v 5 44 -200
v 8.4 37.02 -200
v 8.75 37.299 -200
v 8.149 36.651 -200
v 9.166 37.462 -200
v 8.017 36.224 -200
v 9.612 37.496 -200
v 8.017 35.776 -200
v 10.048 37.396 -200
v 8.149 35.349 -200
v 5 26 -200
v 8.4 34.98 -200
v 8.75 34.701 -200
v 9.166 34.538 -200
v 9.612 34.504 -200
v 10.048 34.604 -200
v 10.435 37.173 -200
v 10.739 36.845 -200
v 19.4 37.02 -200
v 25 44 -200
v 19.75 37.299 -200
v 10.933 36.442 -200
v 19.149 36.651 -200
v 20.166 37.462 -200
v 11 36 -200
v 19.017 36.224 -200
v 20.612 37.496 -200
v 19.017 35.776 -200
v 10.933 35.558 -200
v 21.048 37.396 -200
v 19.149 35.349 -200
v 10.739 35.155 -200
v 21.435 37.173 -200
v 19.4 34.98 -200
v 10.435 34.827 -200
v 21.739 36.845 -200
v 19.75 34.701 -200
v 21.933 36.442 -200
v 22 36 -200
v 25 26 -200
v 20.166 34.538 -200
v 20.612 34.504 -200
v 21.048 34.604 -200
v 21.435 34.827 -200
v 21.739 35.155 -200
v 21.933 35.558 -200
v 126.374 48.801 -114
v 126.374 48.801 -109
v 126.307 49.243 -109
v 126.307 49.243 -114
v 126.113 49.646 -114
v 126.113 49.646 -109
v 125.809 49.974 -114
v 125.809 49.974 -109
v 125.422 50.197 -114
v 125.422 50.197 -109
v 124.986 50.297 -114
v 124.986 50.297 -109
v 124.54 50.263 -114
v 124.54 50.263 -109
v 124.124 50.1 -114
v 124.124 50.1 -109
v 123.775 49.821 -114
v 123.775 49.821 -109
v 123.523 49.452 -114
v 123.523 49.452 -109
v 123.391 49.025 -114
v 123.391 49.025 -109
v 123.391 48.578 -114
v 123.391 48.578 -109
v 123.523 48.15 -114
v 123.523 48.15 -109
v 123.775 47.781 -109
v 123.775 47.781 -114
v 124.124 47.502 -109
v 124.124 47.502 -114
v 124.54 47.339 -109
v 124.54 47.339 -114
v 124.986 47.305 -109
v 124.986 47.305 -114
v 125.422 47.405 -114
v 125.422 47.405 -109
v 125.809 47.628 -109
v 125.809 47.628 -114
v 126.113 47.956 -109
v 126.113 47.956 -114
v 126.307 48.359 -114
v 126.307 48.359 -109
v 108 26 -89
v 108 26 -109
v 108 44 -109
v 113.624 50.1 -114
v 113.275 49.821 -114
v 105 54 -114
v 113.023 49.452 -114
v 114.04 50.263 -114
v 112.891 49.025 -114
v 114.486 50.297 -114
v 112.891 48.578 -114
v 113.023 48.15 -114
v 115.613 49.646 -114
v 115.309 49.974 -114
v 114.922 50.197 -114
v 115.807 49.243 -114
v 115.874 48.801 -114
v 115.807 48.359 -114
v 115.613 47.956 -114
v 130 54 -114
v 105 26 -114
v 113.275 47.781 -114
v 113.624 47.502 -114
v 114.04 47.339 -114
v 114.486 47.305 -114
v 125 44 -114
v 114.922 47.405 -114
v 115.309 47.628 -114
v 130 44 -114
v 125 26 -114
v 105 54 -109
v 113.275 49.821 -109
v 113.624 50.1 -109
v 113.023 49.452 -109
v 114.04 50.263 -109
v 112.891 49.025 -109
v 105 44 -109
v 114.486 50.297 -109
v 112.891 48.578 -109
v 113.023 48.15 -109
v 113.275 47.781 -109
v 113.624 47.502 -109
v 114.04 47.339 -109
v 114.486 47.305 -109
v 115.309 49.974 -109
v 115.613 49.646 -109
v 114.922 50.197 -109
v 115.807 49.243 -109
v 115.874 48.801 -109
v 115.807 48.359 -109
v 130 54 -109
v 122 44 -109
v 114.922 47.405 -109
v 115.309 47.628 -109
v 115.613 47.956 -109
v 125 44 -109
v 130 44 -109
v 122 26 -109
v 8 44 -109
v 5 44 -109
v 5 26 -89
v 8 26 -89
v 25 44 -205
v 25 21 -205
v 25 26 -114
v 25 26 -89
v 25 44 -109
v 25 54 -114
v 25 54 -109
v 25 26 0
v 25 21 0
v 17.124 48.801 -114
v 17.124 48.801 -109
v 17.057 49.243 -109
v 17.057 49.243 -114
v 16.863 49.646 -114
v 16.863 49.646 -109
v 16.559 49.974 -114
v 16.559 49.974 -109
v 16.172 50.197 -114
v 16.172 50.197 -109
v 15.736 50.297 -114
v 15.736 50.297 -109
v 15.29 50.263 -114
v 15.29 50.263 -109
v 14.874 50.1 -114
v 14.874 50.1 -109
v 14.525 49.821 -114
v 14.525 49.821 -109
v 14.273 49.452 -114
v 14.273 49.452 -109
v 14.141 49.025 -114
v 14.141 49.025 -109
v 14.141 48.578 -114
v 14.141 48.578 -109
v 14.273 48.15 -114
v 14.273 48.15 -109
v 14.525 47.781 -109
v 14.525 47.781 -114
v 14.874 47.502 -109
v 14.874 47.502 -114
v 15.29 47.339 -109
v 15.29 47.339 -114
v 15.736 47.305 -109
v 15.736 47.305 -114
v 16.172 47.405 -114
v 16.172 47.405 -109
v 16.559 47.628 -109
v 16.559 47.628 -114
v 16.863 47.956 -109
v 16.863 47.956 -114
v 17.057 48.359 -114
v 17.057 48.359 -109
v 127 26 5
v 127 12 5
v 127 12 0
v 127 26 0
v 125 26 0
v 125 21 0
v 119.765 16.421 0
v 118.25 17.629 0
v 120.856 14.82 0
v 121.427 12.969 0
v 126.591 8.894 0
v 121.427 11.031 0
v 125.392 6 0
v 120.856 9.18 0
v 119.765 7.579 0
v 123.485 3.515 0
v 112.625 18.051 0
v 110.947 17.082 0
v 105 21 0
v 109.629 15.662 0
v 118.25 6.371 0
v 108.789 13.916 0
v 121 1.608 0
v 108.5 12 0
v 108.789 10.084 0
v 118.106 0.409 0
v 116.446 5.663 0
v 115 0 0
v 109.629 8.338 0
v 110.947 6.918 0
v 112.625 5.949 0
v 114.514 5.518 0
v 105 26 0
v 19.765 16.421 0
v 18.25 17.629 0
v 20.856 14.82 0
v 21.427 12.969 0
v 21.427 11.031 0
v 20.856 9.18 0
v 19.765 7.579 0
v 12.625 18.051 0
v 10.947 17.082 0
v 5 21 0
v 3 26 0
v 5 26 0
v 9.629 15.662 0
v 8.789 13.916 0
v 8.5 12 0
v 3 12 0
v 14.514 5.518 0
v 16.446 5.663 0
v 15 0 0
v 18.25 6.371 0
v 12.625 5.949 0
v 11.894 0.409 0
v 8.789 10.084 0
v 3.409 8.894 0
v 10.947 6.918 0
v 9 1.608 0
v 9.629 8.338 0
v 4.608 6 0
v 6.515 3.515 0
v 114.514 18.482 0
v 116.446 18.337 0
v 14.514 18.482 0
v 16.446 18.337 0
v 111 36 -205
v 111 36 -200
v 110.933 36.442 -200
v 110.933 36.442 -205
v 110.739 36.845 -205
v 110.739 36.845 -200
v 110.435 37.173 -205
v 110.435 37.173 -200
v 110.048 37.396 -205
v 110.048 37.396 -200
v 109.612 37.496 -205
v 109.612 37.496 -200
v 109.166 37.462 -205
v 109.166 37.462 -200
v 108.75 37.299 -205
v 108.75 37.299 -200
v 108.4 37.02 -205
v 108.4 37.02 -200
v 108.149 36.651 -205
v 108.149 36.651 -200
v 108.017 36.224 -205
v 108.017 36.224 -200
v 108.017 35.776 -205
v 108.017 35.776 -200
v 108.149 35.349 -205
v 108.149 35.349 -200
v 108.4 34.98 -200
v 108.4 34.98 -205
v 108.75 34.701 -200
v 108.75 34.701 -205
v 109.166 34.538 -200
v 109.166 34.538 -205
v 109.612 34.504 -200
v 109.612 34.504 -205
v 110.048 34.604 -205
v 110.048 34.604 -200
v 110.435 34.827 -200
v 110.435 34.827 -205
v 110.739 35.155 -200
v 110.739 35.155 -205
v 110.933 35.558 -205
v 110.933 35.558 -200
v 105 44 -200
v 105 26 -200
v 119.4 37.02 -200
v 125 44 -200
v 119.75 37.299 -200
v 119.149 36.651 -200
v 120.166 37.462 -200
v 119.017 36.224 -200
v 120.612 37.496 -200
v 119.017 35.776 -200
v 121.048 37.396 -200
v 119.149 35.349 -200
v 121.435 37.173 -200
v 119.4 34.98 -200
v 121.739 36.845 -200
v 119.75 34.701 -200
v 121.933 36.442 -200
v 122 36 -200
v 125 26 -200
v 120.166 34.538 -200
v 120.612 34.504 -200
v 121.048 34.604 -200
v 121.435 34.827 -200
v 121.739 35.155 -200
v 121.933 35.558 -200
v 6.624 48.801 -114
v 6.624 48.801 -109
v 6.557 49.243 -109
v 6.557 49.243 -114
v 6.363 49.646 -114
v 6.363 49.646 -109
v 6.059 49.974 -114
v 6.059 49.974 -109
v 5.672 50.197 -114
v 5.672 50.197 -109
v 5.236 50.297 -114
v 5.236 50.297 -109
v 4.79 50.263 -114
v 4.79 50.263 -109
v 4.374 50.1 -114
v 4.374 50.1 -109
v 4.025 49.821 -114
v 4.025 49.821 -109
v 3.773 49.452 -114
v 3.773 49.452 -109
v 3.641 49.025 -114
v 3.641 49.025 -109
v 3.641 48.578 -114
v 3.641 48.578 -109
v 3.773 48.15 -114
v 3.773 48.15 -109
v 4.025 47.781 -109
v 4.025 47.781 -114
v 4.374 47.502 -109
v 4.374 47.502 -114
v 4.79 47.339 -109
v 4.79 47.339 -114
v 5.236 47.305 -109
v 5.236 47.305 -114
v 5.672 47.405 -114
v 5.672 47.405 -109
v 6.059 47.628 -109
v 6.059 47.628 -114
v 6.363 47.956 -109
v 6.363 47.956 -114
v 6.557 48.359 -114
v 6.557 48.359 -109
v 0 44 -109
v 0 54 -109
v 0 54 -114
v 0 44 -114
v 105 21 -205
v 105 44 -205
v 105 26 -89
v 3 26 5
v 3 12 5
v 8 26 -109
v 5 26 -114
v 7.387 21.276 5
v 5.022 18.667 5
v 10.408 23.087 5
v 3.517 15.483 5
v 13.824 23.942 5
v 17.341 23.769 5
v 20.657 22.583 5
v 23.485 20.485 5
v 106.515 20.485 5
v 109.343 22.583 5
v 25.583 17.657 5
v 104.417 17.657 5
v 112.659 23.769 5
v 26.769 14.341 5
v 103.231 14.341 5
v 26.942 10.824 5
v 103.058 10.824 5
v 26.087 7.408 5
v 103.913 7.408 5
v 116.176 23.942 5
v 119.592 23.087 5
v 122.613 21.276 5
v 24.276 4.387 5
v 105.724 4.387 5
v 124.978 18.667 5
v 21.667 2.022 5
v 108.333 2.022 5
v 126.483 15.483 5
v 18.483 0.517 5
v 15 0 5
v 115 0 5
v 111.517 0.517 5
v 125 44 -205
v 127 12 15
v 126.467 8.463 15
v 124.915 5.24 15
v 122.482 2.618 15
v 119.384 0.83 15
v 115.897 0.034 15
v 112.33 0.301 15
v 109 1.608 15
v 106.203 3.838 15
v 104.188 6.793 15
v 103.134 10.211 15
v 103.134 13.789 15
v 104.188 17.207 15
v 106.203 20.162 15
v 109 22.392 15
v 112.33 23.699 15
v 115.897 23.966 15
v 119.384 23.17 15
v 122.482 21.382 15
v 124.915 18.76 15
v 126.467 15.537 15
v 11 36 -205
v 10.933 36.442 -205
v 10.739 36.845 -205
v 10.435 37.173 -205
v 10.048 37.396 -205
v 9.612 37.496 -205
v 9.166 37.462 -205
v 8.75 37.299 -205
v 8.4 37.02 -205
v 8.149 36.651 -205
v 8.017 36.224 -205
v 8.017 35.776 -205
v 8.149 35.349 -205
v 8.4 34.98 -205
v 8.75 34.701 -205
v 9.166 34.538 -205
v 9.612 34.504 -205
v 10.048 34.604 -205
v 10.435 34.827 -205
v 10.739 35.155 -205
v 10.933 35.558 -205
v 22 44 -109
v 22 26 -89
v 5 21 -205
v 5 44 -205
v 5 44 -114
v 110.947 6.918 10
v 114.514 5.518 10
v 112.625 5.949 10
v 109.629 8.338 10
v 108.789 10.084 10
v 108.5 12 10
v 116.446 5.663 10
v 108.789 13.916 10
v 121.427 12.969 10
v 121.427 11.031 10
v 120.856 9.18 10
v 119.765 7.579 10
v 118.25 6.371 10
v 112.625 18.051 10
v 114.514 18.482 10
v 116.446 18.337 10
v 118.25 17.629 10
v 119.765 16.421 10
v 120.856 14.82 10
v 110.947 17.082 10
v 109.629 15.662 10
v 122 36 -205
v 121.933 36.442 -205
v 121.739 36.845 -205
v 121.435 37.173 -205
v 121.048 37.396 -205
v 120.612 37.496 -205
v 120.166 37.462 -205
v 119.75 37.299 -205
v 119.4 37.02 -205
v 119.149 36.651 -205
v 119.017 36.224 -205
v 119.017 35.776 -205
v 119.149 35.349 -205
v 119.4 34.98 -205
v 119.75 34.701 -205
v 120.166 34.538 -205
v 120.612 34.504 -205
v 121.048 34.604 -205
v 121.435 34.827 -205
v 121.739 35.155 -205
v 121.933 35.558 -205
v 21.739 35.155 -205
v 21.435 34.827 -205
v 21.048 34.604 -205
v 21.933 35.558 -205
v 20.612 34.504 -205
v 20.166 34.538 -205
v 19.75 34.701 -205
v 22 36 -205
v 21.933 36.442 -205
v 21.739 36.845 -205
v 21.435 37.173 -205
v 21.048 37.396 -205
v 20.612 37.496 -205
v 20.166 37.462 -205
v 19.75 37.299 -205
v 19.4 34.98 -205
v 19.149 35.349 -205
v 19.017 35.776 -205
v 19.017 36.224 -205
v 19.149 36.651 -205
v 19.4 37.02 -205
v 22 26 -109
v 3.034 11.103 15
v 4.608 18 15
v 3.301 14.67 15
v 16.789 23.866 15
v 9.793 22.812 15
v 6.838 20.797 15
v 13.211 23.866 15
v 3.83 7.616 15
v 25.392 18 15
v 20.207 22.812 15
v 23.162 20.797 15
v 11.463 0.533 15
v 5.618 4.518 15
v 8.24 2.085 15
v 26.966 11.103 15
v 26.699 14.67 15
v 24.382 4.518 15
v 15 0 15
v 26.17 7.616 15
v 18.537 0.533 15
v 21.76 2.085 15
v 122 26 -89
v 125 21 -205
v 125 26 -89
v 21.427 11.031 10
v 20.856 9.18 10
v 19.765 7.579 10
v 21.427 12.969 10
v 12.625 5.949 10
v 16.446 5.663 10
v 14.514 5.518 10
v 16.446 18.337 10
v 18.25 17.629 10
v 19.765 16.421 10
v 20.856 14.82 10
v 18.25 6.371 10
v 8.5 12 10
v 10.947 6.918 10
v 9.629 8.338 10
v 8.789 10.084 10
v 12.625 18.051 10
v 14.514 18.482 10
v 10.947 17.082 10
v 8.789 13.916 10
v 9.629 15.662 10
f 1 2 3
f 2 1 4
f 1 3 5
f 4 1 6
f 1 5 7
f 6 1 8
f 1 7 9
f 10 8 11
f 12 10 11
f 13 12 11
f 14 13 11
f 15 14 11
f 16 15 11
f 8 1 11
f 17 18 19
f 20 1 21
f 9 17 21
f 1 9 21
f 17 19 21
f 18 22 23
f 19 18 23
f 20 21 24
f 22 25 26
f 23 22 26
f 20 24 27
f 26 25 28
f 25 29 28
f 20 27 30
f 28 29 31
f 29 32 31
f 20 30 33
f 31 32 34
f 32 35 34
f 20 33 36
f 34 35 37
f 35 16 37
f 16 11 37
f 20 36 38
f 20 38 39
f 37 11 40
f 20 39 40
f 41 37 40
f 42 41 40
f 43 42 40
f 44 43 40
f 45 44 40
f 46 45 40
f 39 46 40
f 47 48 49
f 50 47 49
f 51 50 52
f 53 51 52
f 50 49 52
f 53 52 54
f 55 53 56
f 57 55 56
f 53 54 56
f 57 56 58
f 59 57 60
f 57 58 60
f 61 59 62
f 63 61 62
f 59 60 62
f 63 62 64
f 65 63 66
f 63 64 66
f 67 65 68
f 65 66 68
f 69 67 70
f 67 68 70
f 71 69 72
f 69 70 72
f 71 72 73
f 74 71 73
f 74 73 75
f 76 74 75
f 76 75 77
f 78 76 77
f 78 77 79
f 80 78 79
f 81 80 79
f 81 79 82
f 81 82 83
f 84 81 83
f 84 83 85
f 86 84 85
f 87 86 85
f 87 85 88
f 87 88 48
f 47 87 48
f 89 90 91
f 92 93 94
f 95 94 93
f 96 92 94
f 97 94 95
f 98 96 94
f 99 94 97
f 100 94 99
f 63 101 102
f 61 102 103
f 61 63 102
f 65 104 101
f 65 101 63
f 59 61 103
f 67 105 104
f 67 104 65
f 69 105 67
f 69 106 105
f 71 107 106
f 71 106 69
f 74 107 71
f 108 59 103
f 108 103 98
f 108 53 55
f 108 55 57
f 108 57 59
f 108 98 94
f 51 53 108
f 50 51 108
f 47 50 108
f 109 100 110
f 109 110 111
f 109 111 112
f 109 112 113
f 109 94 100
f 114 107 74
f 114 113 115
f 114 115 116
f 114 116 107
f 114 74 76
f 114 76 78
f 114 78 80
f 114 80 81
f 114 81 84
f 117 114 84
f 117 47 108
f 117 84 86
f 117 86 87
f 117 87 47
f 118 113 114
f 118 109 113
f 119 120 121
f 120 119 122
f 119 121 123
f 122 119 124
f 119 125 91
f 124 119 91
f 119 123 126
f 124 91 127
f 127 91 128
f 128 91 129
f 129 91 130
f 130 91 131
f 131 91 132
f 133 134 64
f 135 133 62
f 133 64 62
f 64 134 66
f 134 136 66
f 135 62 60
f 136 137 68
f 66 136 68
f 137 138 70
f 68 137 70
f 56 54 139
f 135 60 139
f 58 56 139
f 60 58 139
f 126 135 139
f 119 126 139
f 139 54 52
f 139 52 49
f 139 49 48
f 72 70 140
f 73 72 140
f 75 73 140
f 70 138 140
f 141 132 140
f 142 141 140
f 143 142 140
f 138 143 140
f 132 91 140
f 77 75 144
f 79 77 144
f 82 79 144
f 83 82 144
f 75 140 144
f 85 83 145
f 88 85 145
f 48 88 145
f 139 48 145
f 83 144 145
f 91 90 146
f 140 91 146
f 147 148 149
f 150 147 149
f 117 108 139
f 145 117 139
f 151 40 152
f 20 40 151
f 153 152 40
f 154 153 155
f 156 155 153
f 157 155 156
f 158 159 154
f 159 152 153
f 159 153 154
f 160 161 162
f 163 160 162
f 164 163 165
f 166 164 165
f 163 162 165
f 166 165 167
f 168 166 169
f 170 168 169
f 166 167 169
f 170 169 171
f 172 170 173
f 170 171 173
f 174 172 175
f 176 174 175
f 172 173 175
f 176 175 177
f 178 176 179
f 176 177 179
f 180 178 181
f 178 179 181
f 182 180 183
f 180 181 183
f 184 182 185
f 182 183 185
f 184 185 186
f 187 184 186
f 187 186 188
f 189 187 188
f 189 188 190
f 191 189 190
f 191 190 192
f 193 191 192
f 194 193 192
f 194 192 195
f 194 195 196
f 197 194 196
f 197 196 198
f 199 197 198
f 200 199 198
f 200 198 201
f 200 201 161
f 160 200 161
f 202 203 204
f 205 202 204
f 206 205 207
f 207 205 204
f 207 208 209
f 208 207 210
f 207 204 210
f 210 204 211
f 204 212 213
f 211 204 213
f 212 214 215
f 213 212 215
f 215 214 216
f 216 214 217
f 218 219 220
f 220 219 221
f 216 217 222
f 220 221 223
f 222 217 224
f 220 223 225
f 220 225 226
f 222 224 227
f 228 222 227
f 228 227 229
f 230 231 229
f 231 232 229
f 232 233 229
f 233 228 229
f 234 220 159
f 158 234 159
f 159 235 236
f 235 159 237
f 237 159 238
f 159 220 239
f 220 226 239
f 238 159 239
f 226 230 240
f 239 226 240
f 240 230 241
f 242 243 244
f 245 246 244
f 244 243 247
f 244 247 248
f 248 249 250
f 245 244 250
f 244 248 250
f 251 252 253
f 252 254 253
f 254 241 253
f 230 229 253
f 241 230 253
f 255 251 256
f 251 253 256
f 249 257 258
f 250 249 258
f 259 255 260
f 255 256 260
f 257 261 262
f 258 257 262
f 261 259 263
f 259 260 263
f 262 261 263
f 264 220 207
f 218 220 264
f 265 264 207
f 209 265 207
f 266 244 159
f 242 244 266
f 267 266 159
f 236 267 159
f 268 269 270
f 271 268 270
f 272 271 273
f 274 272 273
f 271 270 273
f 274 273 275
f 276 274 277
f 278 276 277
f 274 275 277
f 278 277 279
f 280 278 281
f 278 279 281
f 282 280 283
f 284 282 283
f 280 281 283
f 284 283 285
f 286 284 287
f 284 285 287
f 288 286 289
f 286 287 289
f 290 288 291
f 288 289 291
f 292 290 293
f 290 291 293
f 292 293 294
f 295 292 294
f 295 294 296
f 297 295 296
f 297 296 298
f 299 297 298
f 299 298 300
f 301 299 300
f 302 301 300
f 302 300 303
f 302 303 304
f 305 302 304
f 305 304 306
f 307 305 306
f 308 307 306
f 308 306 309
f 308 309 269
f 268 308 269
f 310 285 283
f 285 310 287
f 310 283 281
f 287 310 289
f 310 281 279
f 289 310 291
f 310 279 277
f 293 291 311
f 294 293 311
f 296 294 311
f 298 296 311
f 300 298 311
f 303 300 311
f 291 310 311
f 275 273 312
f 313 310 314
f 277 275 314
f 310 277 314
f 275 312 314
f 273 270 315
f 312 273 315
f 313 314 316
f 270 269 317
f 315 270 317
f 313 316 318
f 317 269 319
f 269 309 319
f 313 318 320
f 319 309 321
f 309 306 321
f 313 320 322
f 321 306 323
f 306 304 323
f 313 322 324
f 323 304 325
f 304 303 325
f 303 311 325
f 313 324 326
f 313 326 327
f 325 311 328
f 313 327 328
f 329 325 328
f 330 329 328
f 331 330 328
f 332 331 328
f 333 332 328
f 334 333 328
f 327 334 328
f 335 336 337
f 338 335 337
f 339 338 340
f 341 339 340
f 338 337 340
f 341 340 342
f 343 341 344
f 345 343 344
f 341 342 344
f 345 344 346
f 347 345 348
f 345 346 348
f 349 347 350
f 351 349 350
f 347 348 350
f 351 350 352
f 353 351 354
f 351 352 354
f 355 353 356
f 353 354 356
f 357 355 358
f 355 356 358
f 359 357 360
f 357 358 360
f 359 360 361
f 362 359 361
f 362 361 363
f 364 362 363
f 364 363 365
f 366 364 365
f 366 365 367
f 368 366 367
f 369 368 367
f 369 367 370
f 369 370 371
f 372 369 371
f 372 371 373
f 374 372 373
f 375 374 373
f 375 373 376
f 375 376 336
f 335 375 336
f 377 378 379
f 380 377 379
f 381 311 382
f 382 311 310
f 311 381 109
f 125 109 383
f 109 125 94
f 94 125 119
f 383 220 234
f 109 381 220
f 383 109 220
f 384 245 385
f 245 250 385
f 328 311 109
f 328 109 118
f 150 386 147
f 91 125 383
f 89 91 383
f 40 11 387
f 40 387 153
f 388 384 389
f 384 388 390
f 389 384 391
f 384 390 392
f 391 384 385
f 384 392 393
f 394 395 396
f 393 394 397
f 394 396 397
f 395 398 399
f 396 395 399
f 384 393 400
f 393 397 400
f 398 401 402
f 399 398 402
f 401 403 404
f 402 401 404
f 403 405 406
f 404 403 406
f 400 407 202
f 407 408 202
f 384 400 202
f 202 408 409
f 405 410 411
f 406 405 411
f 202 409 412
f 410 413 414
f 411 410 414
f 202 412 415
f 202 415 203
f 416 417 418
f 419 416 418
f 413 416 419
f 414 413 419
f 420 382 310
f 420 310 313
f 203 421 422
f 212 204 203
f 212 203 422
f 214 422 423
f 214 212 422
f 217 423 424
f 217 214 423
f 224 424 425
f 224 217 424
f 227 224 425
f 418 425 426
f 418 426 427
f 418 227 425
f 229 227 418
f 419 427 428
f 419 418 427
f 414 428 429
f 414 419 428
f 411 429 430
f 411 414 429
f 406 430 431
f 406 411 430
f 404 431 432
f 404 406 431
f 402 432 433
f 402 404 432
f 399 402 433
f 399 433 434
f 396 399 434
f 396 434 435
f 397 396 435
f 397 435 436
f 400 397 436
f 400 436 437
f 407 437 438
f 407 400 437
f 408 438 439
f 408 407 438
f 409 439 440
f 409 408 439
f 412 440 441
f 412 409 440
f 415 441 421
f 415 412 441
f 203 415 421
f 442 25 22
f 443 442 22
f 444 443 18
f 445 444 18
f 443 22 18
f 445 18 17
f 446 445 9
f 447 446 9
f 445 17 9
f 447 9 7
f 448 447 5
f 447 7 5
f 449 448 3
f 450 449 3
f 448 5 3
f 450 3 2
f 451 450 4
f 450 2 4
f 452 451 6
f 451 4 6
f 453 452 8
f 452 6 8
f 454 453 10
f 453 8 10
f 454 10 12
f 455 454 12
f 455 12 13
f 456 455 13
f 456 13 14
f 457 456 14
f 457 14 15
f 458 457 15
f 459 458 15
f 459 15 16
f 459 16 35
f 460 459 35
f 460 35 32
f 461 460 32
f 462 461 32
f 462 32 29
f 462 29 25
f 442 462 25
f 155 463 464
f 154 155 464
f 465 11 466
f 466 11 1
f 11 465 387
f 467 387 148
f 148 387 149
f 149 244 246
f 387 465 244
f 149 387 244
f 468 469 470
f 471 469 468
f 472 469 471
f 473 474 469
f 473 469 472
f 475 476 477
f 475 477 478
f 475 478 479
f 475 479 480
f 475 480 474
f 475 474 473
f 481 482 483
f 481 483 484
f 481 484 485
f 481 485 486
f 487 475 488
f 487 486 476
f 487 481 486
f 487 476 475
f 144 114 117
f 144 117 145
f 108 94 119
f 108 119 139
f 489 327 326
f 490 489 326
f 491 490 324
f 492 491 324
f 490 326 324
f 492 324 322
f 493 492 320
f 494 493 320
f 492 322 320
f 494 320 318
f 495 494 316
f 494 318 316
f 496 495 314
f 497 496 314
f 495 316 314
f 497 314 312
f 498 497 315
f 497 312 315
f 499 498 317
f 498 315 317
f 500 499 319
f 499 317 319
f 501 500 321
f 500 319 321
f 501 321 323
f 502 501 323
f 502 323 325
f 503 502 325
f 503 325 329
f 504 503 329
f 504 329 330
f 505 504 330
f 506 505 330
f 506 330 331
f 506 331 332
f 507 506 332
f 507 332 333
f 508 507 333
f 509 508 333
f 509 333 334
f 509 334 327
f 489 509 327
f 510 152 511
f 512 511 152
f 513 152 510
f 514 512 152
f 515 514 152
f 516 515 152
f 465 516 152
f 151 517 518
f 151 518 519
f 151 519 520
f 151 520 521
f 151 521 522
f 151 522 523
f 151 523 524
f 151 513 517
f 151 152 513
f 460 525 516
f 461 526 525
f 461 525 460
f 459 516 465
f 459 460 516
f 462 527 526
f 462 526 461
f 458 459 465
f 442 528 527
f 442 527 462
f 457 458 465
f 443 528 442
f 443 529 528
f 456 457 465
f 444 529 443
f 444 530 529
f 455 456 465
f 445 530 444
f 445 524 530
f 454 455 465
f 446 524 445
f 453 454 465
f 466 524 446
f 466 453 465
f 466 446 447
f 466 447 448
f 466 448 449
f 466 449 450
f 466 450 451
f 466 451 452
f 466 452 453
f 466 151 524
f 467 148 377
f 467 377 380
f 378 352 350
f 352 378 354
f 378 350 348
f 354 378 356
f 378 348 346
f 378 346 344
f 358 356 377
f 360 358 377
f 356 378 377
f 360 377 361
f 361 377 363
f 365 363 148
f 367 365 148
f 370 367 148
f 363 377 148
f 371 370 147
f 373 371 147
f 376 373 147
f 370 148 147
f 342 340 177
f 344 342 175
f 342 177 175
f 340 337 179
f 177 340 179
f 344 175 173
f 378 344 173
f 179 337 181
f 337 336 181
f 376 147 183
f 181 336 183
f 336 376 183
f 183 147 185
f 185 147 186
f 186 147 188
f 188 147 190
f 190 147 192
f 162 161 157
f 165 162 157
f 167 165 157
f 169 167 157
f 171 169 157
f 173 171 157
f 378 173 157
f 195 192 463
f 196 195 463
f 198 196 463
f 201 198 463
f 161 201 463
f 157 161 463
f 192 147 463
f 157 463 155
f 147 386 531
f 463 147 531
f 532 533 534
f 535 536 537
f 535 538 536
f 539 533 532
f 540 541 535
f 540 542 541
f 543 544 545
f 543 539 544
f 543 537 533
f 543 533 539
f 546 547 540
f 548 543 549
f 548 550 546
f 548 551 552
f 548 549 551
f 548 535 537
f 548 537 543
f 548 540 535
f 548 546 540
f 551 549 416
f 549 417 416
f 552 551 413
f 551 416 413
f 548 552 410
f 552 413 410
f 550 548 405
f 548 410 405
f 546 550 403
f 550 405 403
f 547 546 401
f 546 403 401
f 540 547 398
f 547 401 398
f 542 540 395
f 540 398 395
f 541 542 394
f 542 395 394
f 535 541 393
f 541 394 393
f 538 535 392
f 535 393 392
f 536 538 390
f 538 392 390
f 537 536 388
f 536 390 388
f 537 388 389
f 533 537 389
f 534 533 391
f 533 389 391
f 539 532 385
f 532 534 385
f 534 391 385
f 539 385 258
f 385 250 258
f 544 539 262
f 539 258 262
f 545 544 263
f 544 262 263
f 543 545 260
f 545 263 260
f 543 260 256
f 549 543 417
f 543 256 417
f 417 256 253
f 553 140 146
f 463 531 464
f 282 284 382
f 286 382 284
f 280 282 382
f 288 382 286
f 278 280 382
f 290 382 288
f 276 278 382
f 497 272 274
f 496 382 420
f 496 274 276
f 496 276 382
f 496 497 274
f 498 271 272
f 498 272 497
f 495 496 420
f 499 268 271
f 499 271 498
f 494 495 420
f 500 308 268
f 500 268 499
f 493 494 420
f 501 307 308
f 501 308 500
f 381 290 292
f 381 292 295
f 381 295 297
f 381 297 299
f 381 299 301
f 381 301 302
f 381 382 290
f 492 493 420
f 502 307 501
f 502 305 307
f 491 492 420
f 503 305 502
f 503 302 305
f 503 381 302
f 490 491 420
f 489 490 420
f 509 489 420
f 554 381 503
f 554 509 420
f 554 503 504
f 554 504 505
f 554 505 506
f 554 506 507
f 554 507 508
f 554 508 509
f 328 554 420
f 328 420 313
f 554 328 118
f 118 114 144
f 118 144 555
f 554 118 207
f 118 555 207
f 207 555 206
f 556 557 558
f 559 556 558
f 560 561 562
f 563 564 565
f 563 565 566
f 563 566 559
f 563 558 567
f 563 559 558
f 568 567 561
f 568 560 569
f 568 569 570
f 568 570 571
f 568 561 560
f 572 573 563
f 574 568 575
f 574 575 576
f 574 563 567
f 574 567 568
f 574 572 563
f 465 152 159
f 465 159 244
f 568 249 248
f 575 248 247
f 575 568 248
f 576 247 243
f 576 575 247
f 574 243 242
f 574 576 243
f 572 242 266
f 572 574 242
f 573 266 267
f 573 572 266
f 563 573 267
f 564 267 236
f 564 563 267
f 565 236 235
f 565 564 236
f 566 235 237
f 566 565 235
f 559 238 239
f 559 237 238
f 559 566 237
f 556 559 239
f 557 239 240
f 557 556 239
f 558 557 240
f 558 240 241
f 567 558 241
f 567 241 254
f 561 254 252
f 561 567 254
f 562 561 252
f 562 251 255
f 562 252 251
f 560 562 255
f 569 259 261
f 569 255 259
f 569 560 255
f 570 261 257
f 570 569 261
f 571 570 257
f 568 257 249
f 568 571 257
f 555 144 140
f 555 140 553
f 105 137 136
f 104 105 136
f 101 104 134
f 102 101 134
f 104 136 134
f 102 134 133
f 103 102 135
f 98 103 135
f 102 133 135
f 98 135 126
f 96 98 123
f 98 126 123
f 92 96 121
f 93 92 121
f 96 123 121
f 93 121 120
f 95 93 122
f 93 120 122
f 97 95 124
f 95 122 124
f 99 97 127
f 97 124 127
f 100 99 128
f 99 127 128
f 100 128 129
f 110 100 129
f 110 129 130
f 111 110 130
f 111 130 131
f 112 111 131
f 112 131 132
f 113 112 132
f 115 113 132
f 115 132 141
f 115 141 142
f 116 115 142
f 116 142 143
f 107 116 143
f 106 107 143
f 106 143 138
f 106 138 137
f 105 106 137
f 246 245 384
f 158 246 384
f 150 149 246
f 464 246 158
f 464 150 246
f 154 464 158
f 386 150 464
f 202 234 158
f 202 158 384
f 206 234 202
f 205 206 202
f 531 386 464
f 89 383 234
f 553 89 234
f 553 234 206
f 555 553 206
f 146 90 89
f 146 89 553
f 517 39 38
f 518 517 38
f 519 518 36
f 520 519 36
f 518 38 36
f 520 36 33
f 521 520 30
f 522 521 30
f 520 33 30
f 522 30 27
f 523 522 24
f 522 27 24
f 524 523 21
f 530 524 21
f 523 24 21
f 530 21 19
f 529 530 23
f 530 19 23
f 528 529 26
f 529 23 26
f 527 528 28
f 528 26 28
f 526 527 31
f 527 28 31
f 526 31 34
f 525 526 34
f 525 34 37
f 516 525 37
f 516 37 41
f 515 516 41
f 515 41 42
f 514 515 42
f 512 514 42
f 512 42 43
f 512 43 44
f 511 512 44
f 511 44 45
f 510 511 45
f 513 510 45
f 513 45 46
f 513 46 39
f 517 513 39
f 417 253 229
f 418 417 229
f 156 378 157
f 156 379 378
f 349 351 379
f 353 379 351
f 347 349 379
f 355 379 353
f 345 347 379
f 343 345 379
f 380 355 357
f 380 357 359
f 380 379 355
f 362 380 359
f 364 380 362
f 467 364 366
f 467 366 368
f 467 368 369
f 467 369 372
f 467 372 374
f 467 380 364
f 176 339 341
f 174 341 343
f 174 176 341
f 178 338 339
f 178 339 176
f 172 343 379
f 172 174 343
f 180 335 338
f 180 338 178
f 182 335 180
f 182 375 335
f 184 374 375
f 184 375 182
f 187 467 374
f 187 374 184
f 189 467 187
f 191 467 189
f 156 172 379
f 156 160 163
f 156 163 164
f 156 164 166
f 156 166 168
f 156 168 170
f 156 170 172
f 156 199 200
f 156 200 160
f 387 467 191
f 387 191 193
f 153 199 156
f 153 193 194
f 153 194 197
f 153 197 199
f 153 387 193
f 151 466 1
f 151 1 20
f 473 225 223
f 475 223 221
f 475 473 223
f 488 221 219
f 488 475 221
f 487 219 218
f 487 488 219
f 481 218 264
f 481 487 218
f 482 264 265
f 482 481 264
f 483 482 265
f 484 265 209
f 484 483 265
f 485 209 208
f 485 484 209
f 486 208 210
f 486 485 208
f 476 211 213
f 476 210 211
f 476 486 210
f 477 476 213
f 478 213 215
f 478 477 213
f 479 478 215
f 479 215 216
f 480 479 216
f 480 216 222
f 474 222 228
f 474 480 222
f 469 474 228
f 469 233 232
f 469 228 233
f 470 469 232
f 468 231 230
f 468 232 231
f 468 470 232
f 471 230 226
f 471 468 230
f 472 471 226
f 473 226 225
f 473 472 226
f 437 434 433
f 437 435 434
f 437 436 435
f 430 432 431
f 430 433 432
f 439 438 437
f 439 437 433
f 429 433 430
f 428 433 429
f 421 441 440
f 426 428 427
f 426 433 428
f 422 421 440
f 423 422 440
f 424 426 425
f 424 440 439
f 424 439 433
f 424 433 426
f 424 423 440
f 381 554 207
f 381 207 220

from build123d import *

# Parameters (mm, degrees)
SKETCH1_W               = 130
SKETCH1_H               = 24
BOSS_EXTRUDE1_DEPTH     = 5
CUT_EXTRUDE1_DEPTH      = 133.291345144
CUT_EXTRUDE1_DEPTH_BACK = 133.291345144
SKETCH2_R               = 6.5
SKETCH3_R               = 12
BOSS_EXTRUDE3_DEPTH     = 10
SKETCH4_R               = 6.5
CUT_EXTRUDE2_DEPTH      = 5
CUT_EXTRUDE3_DEPTH      = 133.574507353
CUT_EXTRUDE3_DEPTH_BACK = 133.574507353
BOSS_EXTRUDE4_DEPTH     = 2
SKETCH7_W               = 20
SKETCH7_H               = 5
BOSS_EXTRUDE5_DEPTH     = 205
SKETCH8_W               = 20
SKETCH8_H               = 5
BOSS_EXTRUDE6_DEPTH     = 28
SKETCH9_W               = 20
SKETCH9_H               = 5
BOSS_EXTRUDE7_DEPTH     = 18
SKETCH10_W              = 5
SKETCH10_H              = 10
BOSS_EXTRUDE8_DEPTH     = 25
SKETCH11_W              = 5
SKETCH11_H              = 10
BOSS_EXTRUDE9_DEPTH     = 25
SKETCH12_R              = 1.5
CUT_EXTRUDE4_DEPTH      = 188.59530911
THICKEN1_T2             = 3
THICKEN2_START          = 22
THICKEN2_DEPTH          = 3
THICKEN3_START          = 5
THICKEN3_DEPTH          = 3
THICKEN4_START          = 105
THICKEN4_DEPTH          = 3
CUT_EXTRUDE5_REACH      = 258.984
SKETCH14_R              = 1.5


# Read off the part's stored shape, not the designer's step: Thicken2, Thicken3, Thicken4
with BuildPart() as part:
    # Sketch1 → Boss-Extrude1 (new body)
    with BuildSketch(Plane.XY):
        with Locations((65, 12)):
            Rectangle(SKETCH1_W, SKETCH1_H)
    extrude(amount=BOSS_EXTRUDE1_DEPTH)

    # Sketch2 → Cut-Extrude1 (cut, two sides: drawn at the far end of the back side and taken through both)
    with BuildSketch(Plane(origin=(0, 0, 0), x_dir=(-1, 0, 0), z_dir=(0, 0, -1)).offset(-CUT_EXTRUDE1_DEPTH_BACK)):
        with Locations((-15, 12)):
            Circle(SKETCH2_R)
        with Locations((-115, 12)):
            Circle(SKETCH2_R)
    extrude(amount=CUT_EXTRUDE1_DEPTH + CUT_EXTRUDE1_DEPTH_BACK, mode=Mode.SUBTRACT)

    # Sketch3 → Boss-Extrude3 (add)
    with BuildSketch(Plane.XY.offset(5)):
        with Locations(Location((15, 12, 0), (0, 0, 270))):
            Circle(SKETCH3_R)
        with Locations(Location((115, 12, 0), (0, 0, 270))):
            Circle(SKETCH3_R)
    extrude(amount=BOSS_EXTRUDE3_DEPTH)

    # Sketch4 → Cut-Extrude2 (cut)
    with BuildSketch(Plane(origin=(0, 0, 5), x_dir=(-1, 0, 0), z_dir=(0, 0, -1))):
        with Locations((-15, 12)):
            Circle(SKETCH4_R)
        with Locations((-115, 12)):
            Circle(SKETCH4_R)
    extrude(amount=-CUT_EXTRUDE2_DEPTH, mode=Mode.SUBTRACT)

    # Sketch5 → Cut-Extrude3 (cut, two sides: drawn at the far end of the back side and taken through both)
    with BuildSketch(Plane.XY.offset(5).offset(-CUT_EXTRUDE3_DEPTH_BACK)):
        with BuildLine():
            Line((3, 24), (0, 24))
            Line((0, 24), (0, 0))
            Line((0, 0), (15, 0))
            ThreePointArc((15, 0), (6.514718626, 3.514718626), (3, 12))
            Line((3, 12), (3, 24))
        make_face()
        with BuildLine():
            Line((115, 0), (130, 0))
            Line((130, 0), (130, 24))
            Line((130, 24), (127, 24))
            Line((127, 24), (127, 12))
            ThreePointArc((127, 12), (123.485281374, 3.514718626), (115, 0))
        make_face()
    extrude(amount=CUT_EXTRUDE3_DEPTH + CUT_EXTRUDE3_DEPTH_BACK, mode=Mode.SUBTRACT)

    # Sketch6 → Boss-Extrude4 (add)
    with BuildSketch(Plane(origin=(0, 24, 0), x_dir=(1, 0, 0), z_dir=(0, 1, 0))):
        Polygon((127, 0), (3, 0), (3, -5), (15, -5), (115, -5), (127, -5), align=None)
    extrude(amount=BOSS_EXTRUDE4_DEPTH)

    # Sketch7 → Boss-Extrude5 (add)
    with BuildSketch(Plane(origin=(0, 0, 0), x_dir=(-1, 0, 0), z_dir=(0, 0, -1))):
        with Locations((-115, 23.5)):
            Rectangle(SKETCH7_W, SKETCH7_H)
        with Locations((-15, 23.5)):
            Rectangle(SKETCH7_W, SKETCH7_H)
    extrude(amount=BOSS_EXTRUDE5_DEPTH)

    # Sketch8 → Boss-Extrude6 (add)
    with BuildSketch(Plane(origin=(0, 26, 0), x_dir=(1, 0, 0), z_dir=(0, 1, 0))):
        with Locations((115, 111.5)):
            Rectangle(SKETCH8_W, SKETCH8_H)
        with Locations((15, 111.5)):
            Rectangle(SKETCH8_W, SKETCH8_H)
    extrude(amount=BOSS_EXTRUDE6_DEPTH)

    # Sketch9 → Boss-Extrude7 (add)
    with BuildSketch(Plane(origin=(0, 26, 0), x_dir=(1, 0, 0), z_dir=(0, 1, 0))):
        with Locations((115, 202.5)):
            Rectangle(SKETCH9_W, SKETCH9_H)
        with Locations((15, 202.5)):
            Rectangle(SKETCH9_W, SKETCH9_H)
    extrude(amount=BOSS_EXTRUDE7_DEPTH)

    # Sketch10 → Boss-Extrude8 (add)
    with BuildSketch(Plane.ZY.offset(-105)):
        with Locations((-111.5, 49)):
            Rectangle(SKETCH10_W, SKETCH10_H)
    extrude(amount=-BOSS_EXTRUDE8_DEPTH)

    # Sketch11 → Boss-Extrude9 (add)
    with BuildSketch(Plane(origin=(25, 0, 0), x_dir=(0, 0, -1), z_dir=(1, 0, 0))):
        with Locations((111.5, 49)):
            Rectangle(SKETCH11_W, SKETCH11_H)
    extrude(amount=-BOSS_EXTRUDE9_DEPTH)

    # Sketch12 → Cut-Extrude4 (cut, through all)
    with BuildSketch(Plane.XY.offset(-109)):
        with Locations((124.874085346, 48.801077027)):
            Circle(SKETCH12_R)
        with Locations((114.374085346, 48.801077027)):
            Circle(SKETCH12_R)
        with Locations((15.624085346, 48.801077027)):
            Circle(SKETCH12_R)
        with Locations((5.124085346, 48.801077027)):
            Circle(SKETCH12_R)
    extrude(amount=-CUT_EXTRUDE4_DEPTH, mode=Mode.SUBTRACT)

    # Sketch13 → Surface-Plane1: a flat surface bounded by the sketch
    with BuildSketch(Plane(origin=(125, 0, 0), x_dir=(0, 0, -1), z_dir=(1, 0, 0)), mode=Mode.PRIVATE) as surface_plane1_1_region:
        Polygon((109, 44), (109, 26), (89, 26), align=None)
    surface_plane1_1 = surface_plane1_1_region.sketch.faces()[0]
    add(Solid.thicken(surface_plane1_1, -THICKEN1_T2))

    # Thicken2 outline → Thicken2 (add)
    with BuildSketch(Plane.YZ.offset(THICKEN2_START)):
        Polygon((44, -109), (26, -89), (26, -109), align=None)
    extrude(amount=THICKEN2_DEPTH)

    # Thicken3 outline → Thicken3 (add)
    with BuildSketch(Plane.YZ.offset(THICKEN3_START)):
        Polygon((44, -109), (26, -89), (26, -109), align=None)
    extrude(amount=THICKEN3_DEPTH)

    # Thicken4 outline → Thicken4 (add)
    with BuildSketch(Plane.YZ.offset(THICKEN4_START)):
        Polygon((44, -109), (26, -89), (26, -109), align=None)
    extrude(amount=THICKEN4_DEPTH)

    # Sketch14 → Cut-Extrude5 (cut, up to next)
    with BuildSketch(Plane.XY.offset(-200), mode=Mode.PRIVATE) as cut_extrude5_sk1:
        with Locations((109.5, 36)):
            Circle(SKETCH14_R)
    cut_extrude5_tool1 = extrude(cut_extrude5_sk1.sketch, amount=-CUT_EXTRUDE5_REACH, mode=Mode.PRIVATE) & part.part
    # Sketch14 → Cut-Extrude5 (cut, up to next)
    with BuildSketch(Plane.XY.offset(-200), mode=Mode.PRIVATE) as cut_extrude5_sk2:
        with Locations((120.5, 36)):
            Circle(SKETCH14_R)
    cut_extrude5_tool2 = extrude(cut_extrude5_sk2.sketch, amount=-CUT_EXTRUDE5_REACH, mode=Mode.PRIVATE) & part.part
    # Sketch14 → Cut-Extrude5 (cut, up to next)
    with BuildSketch(Plane.XY.offset(-200), mode=Mode.PRIVATE) as cut_extrude5_sk3:
        with Locations((9.5, 36)):
            Circle(SKETCH14_R)
    cut_extrude5_tool3 = extrude(cut_extrude5_sk3.sketch, amount=-CUT_EXTRUDE5_REACH, mode=Mode.PRIVATE) & part.part
    # Sketch14 → Cut-Extrude5 (cut, up to next)
    with BuildSketch(Plane.XY.offset(-200), mode=Mode.PRIVATE) as cut_extrude5_sk4:
        with Locations((20.5, 36)):
            Circle(SKETCH14_R)
    cut_extrude5_tool4 = extrude(cut_extrude5_sk4.sketch, amount=-CUT_EXTRUDE5_REACH, mode=Mode.PRIVATE) & part.part
    add(cut_extrude5_tool1.solids().sort_by_distance((109.5, 36, -200))[0], mode=Mode.SUBTRACT)
    add(cut_extrude5_tool2.solids().sort_by_distance((120.5, 36, -200))[0], mode=Mode.SUBTRACT)
    add(cut_extrude5_tool3.solids().sort_by_distance((9.5, 36, -200))[0], mode=Mode.SUBTRACT)
    add(cut_extrude5_tool4.solids().sort_by_distance((20.5, 36, -200))[0], mode=Mode.SUBTRACT)


solid = part.part
